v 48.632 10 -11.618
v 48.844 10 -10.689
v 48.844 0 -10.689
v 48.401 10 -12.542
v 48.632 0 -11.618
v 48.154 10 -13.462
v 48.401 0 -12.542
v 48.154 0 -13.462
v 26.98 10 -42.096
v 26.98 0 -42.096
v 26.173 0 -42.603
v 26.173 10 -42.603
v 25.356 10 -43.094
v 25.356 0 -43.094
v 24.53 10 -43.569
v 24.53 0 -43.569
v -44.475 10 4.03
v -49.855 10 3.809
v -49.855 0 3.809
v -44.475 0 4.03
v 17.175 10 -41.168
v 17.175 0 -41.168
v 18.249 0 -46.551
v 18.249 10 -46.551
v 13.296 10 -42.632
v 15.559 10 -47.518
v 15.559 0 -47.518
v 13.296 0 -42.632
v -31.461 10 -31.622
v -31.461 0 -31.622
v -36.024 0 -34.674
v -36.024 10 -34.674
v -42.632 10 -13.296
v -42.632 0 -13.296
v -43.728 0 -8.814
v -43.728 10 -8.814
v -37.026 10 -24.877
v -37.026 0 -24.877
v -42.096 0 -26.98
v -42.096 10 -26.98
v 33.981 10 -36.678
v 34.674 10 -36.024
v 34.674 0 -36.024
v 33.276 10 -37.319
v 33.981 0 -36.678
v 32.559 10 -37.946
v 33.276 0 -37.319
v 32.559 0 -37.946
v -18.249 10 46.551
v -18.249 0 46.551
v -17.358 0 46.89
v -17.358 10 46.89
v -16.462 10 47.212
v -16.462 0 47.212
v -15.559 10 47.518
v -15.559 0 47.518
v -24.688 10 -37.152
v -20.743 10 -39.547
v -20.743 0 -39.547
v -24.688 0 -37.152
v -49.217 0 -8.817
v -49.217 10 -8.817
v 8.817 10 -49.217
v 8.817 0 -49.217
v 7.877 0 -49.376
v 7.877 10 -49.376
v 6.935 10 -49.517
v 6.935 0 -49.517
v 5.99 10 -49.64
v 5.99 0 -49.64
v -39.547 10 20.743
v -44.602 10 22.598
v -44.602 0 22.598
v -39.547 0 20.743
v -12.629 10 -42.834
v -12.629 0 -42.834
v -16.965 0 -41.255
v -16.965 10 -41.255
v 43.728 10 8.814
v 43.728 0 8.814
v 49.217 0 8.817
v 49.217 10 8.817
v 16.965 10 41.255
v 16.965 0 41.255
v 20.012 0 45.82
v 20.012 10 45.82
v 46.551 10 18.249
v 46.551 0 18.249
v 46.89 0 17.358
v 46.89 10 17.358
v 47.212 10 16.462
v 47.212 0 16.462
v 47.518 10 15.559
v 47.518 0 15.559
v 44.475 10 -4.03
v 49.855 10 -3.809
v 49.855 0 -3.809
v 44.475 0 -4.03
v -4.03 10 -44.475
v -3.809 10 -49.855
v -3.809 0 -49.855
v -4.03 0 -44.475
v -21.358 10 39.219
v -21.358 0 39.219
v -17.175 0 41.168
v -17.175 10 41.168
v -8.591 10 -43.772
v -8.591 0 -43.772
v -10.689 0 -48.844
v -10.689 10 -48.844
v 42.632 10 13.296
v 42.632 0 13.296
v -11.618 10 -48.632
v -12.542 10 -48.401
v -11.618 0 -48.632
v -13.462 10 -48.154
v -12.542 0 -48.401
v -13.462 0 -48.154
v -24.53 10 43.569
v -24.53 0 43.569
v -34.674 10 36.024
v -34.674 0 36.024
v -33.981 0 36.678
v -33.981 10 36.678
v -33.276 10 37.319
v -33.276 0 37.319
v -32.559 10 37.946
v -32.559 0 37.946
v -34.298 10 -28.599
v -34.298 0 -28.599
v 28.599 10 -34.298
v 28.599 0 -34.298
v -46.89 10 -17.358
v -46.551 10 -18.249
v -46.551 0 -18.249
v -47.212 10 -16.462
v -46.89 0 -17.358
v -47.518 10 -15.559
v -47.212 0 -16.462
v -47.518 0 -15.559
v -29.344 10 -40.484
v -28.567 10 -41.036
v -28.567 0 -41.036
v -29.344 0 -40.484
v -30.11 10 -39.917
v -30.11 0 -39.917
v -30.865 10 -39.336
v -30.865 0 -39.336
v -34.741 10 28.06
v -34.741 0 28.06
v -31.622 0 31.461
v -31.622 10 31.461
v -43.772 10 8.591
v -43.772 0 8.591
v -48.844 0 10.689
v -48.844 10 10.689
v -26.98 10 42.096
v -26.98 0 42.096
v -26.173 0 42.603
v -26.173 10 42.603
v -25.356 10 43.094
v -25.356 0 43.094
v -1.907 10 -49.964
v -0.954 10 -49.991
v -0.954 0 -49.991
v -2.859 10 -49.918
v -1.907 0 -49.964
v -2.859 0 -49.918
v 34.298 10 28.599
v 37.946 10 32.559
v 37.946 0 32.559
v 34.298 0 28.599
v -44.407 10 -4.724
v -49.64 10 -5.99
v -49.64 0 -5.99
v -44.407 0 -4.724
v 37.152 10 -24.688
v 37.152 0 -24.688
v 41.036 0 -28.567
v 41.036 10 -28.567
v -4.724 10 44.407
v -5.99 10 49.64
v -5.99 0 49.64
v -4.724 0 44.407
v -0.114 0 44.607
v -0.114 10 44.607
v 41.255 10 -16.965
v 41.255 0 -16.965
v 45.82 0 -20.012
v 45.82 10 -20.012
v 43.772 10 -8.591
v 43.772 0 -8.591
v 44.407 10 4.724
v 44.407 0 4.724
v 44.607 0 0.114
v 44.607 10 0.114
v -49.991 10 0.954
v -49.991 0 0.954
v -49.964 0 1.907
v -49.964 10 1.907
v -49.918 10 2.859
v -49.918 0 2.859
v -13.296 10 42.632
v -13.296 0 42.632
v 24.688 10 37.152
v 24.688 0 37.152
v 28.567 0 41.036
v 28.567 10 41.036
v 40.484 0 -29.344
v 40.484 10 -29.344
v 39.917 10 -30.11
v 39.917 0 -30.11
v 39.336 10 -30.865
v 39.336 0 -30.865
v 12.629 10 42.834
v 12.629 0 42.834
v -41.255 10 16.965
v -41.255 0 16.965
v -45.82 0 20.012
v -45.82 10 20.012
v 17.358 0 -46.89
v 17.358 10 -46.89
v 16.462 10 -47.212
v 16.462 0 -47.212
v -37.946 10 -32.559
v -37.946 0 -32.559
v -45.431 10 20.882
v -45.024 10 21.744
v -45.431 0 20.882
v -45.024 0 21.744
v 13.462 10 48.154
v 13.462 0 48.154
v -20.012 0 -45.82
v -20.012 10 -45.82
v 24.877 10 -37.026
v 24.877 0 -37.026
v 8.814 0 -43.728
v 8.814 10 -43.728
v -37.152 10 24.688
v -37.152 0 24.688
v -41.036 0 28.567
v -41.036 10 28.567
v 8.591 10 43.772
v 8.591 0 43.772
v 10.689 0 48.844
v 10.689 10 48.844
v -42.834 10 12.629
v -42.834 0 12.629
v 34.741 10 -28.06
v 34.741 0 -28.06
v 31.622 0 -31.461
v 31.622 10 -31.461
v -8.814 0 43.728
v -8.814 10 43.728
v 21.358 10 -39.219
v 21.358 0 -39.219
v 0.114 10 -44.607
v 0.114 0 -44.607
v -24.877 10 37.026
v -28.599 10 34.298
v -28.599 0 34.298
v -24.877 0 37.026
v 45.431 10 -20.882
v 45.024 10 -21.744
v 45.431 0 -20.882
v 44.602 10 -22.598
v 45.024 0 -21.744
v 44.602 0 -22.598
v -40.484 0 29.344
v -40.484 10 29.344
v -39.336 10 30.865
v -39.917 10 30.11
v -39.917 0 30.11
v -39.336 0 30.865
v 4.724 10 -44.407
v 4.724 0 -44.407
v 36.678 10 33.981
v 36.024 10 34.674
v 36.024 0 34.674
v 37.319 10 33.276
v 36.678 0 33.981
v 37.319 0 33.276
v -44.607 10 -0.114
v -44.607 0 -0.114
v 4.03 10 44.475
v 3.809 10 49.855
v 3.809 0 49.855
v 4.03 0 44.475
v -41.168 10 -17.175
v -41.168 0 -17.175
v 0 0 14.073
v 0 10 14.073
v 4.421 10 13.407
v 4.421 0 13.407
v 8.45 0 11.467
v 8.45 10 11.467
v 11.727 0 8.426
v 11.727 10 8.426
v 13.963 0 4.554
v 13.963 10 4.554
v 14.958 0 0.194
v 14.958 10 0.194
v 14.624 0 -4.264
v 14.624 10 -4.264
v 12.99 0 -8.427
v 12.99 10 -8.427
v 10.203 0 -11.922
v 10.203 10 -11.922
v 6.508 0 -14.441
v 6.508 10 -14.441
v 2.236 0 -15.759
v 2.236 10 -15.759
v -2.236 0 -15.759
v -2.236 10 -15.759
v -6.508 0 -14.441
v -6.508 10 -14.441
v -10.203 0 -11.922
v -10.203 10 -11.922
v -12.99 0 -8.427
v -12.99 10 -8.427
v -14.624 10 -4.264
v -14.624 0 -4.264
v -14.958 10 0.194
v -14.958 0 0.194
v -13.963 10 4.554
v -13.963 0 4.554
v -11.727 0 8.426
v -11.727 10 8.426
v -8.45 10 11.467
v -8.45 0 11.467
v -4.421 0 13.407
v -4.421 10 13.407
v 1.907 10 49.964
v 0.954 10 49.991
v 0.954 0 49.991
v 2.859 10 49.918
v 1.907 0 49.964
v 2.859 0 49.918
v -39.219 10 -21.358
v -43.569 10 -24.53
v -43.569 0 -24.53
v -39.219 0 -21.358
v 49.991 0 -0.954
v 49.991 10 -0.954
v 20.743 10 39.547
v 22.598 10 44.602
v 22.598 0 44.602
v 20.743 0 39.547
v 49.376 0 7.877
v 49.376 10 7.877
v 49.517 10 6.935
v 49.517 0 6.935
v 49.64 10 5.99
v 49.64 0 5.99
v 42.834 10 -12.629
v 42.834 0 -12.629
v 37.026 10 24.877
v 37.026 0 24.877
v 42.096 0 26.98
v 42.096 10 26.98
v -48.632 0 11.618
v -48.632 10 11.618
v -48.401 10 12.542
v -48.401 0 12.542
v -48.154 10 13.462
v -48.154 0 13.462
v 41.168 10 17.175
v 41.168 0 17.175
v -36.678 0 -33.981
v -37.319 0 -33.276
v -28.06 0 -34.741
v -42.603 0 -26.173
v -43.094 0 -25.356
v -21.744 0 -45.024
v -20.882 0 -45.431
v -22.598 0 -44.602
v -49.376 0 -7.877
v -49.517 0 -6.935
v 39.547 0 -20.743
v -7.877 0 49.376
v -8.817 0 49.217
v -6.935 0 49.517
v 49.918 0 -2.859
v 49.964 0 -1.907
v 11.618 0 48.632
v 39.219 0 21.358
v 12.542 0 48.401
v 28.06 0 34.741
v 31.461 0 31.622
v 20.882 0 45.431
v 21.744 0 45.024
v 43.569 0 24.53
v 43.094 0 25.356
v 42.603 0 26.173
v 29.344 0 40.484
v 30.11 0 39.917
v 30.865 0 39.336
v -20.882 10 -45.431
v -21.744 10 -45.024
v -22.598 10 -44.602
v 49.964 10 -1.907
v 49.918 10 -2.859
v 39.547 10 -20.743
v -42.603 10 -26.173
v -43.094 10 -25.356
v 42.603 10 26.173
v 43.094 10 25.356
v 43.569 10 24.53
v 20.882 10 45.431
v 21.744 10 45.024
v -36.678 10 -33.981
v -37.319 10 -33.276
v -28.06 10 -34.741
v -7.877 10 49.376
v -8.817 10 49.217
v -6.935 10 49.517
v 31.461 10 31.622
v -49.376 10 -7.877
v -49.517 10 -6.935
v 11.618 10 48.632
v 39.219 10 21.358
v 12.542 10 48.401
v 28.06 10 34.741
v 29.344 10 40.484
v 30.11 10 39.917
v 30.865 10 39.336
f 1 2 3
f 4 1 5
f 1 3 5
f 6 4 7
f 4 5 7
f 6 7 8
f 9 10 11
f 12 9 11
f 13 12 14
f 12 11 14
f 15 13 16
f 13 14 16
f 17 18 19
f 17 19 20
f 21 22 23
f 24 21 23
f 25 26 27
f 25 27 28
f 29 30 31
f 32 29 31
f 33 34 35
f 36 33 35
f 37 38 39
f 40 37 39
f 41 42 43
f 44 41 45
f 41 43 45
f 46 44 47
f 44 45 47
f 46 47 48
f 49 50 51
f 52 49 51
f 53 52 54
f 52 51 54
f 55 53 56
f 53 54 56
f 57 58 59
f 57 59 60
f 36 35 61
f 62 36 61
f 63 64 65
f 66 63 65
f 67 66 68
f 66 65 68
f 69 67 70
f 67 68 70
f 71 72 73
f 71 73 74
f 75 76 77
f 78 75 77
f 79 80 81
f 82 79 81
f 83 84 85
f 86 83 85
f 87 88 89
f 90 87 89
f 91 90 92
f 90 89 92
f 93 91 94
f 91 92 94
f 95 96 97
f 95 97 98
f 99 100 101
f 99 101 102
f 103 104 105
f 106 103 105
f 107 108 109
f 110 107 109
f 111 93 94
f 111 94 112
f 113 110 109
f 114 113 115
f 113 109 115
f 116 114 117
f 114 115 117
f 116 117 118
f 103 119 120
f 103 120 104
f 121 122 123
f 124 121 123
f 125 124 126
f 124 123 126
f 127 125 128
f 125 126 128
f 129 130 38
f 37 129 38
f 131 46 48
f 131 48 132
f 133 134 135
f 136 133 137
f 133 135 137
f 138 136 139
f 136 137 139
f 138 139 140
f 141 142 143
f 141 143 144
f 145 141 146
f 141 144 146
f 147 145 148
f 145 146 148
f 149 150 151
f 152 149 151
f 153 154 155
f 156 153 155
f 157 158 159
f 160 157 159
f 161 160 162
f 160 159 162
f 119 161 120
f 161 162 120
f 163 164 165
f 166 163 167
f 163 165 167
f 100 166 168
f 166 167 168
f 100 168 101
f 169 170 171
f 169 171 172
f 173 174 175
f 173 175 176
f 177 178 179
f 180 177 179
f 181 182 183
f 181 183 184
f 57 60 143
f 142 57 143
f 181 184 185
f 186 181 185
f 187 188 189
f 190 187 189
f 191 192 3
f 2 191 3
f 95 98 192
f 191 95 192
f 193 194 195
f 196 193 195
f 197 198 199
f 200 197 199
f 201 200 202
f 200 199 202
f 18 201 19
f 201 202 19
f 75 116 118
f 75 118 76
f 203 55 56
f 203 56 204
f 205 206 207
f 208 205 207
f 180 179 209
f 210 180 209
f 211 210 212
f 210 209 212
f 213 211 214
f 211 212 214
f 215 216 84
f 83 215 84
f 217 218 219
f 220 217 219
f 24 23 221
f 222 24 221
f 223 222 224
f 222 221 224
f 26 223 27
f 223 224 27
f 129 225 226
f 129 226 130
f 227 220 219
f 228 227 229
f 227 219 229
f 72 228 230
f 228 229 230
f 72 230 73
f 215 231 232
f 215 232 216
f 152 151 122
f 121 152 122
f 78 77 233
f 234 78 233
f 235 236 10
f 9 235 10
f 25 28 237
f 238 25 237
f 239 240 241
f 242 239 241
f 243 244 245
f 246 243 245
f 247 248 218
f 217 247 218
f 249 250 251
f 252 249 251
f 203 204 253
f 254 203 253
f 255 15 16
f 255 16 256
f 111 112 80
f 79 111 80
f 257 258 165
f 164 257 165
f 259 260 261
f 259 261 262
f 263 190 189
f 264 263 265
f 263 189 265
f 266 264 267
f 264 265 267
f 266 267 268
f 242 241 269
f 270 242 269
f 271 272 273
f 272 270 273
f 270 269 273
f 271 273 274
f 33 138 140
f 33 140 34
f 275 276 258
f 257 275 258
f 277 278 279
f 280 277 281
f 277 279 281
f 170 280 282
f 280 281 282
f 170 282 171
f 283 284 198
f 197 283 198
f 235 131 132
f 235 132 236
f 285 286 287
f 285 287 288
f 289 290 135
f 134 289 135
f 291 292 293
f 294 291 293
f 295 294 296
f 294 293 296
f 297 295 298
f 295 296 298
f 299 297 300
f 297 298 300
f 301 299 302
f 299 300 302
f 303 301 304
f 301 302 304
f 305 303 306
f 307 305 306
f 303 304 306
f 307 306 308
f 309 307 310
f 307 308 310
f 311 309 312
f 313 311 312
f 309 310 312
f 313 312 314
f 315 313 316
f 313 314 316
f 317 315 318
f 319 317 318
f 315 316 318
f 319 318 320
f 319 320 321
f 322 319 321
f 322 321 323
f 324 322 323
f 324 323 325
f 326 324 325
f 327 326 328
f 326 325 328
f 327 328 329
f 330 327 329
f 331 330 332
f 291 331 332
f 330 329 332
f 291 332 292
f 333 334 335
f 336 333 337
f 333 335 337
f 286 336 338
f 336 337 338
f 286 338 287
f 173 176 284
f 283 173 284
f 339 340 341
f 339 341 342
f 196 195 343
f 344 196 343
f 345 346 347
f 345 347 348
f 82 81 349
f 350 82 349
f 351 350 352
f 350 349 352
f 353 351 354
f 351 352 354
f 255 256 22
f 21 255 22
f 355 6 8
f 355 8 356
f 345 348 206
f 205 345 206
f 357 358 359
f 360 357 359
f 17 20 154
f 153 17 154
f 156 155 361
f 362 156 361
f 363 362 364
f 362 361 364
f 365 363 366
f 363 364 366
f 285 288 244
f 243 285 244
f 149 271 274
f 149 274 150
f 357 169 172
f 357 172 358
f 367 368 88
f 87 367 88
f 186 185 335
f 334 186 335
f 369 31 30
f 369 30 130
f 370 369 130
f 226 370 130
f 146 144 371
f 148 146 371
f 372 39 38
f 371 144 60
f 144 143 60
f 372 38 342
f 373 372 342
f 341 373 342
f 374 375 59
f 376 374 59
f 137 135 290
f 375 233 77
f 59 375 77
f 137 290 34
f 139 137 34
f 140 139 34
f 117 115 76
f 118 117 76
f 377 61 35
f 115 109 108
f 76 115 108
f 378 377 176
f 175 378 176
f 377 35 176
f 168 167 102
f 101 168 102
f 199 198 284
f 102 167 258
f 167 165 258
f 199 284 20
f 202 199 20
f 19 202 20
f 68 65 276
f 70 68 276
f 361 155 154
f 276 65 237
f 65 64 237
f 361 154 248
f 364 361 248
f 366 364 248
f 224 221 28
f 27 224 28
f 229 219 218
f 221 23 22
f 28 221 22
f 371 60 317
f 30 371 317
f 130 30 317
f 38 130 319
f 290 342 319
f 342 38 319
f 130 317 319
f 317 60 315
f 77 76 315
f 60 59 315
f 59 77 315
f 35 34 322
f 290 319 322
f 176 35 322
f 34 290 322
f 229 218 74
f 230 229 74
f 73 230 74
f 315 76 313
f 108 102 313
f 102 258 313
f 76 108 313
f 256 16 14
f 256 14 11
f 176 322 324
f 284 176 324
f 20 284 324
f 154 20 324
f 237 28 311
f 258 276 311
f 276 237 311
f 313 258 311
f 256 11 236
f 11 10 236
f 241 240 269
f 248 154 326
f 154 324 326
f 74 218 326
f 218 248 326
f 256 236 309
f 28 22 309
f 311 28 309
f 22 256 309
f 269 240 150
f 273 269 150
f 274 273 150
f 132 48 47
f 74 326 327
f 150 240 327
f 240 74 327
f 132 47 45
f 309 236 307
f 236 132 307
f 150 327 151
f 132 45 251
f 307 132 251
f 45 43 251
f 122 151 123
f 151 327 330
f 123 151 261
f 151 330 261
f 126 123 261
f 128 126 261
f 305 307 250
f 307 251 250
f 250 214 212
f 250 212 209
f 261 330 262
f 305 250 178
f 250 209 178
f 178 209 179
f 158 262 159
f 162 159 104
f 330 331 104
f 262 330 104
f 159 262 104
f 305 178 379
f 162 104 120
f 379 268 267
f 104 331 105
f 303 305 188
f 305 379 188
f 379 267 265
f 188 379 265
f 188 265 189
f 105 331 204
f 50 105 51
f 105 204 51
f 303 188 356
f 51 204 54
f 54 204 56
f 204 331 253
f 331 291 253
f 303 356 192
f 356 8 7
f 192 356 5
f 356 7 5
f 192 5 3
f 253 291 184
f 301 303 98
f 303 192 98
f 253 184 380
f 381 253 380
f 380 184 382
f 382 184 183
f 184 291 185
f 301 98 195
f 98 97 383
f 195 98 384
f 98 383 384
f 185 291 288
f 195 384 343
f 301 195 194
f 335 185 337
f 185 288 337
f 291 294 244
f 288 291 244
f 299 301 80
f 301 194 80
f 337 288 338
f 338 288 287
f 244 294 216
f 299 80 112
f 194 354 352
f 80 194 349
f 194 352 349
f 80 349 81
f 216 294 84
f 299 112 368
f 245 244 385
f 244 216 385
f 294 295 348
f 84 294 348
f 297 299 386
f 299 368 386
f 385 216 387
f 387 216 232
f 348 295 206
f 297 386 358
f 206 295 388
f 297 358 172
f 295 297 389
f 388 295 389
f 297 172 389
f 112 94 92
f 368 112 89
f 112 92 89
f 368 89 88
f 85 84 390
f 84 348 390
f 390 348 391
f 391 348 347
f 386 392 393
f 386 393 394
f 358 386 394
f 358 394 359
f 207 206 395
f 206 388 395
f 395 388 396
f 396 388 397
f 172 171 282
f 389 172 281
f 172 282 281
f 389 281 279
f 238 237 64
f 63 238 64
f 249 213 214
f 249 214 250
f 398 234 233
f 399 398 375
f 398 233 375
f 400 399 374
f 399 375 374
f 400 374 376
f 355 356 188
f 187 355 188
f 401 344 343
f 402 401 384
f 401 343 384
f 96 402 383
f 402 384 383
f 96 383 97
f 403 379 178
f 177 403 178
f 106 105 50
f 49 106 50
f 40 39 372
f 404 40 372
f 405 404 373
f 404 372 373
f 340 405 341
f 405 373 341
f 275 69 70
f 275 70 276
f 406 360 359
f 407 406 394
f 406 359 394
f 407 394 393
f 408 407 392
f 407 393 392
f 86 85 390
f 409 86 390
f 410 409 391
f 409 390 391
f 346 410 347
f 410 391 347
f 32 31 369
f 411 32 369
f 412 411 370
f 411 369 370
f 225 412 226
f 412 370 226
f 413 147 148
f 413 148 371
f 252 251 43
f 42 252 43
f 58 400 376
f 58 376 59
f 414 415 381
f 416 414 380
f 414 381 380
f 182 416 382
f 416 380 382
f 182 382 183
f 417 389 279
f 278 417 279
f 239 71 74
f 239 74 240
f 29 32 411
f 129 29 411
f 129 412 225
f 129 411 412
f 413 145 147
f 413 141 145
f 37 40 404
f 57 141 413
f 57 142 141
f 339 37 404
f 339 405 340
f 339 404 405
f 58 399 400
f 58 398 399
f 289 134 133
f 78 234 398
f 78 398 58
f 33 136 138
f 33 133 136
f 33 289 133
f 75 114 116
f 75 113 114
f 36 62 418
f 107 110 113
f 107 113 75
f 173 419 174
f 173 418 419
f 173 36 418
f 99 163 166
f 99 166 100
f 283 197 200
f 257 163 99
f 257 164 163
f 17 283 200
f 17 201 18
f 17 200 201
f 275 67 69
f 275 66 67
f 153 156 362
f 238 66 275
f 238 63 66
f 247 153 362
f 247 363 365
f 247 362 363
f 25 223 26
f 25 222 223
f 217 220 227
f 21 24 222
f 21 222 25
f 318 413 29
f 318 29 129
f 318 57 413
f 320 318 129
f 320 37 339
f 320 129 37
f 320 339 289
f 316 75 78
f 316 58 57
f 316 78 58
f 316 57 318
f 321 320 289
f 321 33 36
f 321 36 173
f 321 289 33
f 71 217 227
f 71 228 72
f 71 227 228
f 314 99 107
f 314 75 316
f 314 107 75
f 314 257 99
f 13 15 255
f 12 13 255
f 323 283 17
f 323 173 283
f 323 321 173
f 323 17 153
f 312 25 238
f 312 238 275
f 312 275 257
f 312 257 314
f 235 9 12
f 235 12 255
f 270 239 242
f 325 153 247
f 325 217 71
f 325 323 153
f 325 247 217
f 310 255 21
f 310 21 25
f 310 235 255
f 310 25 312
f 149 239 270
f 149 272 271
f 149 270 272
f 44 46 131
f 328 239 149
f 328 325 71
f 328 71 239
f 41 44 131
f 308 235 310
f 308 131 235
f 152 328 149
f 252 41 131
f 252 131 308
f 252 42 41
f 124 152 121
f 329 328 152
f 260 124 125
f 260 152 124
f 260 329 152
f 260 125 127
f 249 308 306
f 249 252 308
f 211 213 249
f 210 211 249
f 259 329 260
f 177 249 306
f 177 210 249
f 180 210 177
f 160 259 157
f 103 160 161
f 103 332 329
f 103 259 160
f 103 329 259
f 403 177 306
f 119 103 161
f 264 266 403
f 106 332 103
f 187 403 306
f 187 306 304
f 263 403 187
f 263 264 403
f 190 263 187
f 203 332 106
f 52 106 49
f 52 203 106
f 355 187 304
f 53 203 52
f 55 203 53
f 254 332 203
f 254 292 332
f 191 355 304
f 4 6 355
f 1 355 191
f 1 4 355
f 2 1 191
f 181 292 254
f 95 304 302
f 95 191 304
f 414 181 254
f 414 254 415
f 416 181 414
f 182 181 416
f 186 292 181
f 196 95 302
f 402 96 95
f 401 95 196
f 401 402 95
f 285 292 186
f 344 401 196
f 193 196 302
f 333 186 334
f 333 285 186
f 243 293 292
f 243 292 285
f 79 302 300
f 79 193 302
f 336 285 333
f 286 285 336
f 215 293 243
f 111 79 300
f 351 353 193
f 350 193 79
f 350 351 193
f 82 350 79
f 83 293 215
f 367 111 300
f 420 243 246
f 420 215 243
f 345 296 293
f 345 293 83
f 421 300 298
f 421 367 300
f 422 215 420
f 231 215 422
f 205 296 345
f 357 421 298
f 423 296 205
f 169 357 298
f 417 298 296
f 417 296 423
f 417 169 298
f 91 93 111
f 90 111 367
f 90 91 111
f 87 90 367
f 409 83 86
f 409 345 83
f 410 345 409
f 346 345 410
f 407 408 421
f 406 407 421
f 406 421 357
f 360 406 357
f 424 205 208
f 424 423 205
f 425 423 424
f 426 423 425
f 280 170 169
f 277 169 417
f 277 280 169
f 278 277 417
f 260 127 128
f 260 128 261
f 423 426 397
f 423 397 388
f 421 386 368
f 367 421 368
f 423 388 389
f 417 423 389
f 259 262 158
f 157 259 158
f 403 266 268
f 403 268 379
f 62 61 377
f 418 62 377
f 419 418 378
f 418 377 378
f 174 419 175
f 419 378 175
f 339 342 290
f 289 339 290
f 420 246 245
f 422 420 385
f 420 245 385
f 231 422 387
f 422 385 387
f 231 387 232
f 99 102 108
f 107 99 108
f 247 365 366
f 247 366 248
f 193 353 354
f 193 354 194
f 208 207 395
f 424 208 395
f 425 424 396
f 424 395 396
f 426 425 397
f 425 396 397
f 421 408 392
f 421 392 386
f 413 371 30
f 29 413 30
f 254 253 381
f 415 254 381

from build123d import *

# Parameters (mm, degrees)
CROQUIS1_R              = 50
SALIENTE_EXTRUIR1_DEPTH = 10
CROQUIS2_R              = 15
CORTAR_EXTRUIR1_DEPTH   = 10
CORTAR_EXTRUIR14_START  = -14
CORTAR_EXTRUIR14_DEPTH  = 14
MATRIZC1_COUNT          = 32


with BuildPart() as part:
    # Croquis1 → Saliente-Extruir1 (new body)
    with BuildSketch(Plane(origin=(0, 0, 0), x_dir=(1, 0, 0), z_dir=(0, 1, 0))):
        with Locations(Location((0, 0, 0), (0, 0, 270))):
            Circle(CROQUIS1_R)
    extrude(amount=SALIENTE_EXTRUIR1_DEPTH)

    # Croquis2 → Cortar-Extruir1 (cut)
    with BuildSketch(Plane(origin=(0, 10, 0), x_dir=(1, 0, 0), z_dir=(0, 1, 0))):
        with Locations(Location((0, 0.926579846, 0), (0, 0, 270))):
            Circle(CROQUIS2_R)
    extrude(amount=-CORTAR_EXTRUIR1_DEPTH, mode=Mode.SUBTRACT)

    # Croquis3 → Cortar-Extruir14 (cut)
    with BuildSketch(Plane(origin=(0, 10, 0), x_dir=(1, 0, 0), z_dir=(0, 1, 0)).offset(CORTAR_EXTRUIR14_START)):
        with BuildLine():
            Line((4.72393128, 44.406561165), (0.113748969, 44.606905854))
            Line((0.113748969, 44.606905854), (-0.954422894, 49.990889939))
            ThreePointArc((-0.954422894, 49.990889939), (2.523841382, 49.936261621), (5.989888947, 49.639915697))
            Line((5.989888947, 49.639915697), (4.72393128, 44.406561165))
        make_face()
    cortar_extruir14 = extrude(amount=CORTAR_EXTRUIR14_DEPTH, mode=Mode.SUBTRACT)

    # MatrizC1: Cortar-Extruir14 ×32 about axis
    matrizc1_axis = Axis((0, 0, 0), (0, 1, 0))
    for i in range(1, MATRIZC1_COUNT):
        add(cortar_extruir14.rotate(matrizc1_axis, i * 360 / MATRIZC1_COUNT), mode=Mode.SUBTRACT)


solid = part.part
